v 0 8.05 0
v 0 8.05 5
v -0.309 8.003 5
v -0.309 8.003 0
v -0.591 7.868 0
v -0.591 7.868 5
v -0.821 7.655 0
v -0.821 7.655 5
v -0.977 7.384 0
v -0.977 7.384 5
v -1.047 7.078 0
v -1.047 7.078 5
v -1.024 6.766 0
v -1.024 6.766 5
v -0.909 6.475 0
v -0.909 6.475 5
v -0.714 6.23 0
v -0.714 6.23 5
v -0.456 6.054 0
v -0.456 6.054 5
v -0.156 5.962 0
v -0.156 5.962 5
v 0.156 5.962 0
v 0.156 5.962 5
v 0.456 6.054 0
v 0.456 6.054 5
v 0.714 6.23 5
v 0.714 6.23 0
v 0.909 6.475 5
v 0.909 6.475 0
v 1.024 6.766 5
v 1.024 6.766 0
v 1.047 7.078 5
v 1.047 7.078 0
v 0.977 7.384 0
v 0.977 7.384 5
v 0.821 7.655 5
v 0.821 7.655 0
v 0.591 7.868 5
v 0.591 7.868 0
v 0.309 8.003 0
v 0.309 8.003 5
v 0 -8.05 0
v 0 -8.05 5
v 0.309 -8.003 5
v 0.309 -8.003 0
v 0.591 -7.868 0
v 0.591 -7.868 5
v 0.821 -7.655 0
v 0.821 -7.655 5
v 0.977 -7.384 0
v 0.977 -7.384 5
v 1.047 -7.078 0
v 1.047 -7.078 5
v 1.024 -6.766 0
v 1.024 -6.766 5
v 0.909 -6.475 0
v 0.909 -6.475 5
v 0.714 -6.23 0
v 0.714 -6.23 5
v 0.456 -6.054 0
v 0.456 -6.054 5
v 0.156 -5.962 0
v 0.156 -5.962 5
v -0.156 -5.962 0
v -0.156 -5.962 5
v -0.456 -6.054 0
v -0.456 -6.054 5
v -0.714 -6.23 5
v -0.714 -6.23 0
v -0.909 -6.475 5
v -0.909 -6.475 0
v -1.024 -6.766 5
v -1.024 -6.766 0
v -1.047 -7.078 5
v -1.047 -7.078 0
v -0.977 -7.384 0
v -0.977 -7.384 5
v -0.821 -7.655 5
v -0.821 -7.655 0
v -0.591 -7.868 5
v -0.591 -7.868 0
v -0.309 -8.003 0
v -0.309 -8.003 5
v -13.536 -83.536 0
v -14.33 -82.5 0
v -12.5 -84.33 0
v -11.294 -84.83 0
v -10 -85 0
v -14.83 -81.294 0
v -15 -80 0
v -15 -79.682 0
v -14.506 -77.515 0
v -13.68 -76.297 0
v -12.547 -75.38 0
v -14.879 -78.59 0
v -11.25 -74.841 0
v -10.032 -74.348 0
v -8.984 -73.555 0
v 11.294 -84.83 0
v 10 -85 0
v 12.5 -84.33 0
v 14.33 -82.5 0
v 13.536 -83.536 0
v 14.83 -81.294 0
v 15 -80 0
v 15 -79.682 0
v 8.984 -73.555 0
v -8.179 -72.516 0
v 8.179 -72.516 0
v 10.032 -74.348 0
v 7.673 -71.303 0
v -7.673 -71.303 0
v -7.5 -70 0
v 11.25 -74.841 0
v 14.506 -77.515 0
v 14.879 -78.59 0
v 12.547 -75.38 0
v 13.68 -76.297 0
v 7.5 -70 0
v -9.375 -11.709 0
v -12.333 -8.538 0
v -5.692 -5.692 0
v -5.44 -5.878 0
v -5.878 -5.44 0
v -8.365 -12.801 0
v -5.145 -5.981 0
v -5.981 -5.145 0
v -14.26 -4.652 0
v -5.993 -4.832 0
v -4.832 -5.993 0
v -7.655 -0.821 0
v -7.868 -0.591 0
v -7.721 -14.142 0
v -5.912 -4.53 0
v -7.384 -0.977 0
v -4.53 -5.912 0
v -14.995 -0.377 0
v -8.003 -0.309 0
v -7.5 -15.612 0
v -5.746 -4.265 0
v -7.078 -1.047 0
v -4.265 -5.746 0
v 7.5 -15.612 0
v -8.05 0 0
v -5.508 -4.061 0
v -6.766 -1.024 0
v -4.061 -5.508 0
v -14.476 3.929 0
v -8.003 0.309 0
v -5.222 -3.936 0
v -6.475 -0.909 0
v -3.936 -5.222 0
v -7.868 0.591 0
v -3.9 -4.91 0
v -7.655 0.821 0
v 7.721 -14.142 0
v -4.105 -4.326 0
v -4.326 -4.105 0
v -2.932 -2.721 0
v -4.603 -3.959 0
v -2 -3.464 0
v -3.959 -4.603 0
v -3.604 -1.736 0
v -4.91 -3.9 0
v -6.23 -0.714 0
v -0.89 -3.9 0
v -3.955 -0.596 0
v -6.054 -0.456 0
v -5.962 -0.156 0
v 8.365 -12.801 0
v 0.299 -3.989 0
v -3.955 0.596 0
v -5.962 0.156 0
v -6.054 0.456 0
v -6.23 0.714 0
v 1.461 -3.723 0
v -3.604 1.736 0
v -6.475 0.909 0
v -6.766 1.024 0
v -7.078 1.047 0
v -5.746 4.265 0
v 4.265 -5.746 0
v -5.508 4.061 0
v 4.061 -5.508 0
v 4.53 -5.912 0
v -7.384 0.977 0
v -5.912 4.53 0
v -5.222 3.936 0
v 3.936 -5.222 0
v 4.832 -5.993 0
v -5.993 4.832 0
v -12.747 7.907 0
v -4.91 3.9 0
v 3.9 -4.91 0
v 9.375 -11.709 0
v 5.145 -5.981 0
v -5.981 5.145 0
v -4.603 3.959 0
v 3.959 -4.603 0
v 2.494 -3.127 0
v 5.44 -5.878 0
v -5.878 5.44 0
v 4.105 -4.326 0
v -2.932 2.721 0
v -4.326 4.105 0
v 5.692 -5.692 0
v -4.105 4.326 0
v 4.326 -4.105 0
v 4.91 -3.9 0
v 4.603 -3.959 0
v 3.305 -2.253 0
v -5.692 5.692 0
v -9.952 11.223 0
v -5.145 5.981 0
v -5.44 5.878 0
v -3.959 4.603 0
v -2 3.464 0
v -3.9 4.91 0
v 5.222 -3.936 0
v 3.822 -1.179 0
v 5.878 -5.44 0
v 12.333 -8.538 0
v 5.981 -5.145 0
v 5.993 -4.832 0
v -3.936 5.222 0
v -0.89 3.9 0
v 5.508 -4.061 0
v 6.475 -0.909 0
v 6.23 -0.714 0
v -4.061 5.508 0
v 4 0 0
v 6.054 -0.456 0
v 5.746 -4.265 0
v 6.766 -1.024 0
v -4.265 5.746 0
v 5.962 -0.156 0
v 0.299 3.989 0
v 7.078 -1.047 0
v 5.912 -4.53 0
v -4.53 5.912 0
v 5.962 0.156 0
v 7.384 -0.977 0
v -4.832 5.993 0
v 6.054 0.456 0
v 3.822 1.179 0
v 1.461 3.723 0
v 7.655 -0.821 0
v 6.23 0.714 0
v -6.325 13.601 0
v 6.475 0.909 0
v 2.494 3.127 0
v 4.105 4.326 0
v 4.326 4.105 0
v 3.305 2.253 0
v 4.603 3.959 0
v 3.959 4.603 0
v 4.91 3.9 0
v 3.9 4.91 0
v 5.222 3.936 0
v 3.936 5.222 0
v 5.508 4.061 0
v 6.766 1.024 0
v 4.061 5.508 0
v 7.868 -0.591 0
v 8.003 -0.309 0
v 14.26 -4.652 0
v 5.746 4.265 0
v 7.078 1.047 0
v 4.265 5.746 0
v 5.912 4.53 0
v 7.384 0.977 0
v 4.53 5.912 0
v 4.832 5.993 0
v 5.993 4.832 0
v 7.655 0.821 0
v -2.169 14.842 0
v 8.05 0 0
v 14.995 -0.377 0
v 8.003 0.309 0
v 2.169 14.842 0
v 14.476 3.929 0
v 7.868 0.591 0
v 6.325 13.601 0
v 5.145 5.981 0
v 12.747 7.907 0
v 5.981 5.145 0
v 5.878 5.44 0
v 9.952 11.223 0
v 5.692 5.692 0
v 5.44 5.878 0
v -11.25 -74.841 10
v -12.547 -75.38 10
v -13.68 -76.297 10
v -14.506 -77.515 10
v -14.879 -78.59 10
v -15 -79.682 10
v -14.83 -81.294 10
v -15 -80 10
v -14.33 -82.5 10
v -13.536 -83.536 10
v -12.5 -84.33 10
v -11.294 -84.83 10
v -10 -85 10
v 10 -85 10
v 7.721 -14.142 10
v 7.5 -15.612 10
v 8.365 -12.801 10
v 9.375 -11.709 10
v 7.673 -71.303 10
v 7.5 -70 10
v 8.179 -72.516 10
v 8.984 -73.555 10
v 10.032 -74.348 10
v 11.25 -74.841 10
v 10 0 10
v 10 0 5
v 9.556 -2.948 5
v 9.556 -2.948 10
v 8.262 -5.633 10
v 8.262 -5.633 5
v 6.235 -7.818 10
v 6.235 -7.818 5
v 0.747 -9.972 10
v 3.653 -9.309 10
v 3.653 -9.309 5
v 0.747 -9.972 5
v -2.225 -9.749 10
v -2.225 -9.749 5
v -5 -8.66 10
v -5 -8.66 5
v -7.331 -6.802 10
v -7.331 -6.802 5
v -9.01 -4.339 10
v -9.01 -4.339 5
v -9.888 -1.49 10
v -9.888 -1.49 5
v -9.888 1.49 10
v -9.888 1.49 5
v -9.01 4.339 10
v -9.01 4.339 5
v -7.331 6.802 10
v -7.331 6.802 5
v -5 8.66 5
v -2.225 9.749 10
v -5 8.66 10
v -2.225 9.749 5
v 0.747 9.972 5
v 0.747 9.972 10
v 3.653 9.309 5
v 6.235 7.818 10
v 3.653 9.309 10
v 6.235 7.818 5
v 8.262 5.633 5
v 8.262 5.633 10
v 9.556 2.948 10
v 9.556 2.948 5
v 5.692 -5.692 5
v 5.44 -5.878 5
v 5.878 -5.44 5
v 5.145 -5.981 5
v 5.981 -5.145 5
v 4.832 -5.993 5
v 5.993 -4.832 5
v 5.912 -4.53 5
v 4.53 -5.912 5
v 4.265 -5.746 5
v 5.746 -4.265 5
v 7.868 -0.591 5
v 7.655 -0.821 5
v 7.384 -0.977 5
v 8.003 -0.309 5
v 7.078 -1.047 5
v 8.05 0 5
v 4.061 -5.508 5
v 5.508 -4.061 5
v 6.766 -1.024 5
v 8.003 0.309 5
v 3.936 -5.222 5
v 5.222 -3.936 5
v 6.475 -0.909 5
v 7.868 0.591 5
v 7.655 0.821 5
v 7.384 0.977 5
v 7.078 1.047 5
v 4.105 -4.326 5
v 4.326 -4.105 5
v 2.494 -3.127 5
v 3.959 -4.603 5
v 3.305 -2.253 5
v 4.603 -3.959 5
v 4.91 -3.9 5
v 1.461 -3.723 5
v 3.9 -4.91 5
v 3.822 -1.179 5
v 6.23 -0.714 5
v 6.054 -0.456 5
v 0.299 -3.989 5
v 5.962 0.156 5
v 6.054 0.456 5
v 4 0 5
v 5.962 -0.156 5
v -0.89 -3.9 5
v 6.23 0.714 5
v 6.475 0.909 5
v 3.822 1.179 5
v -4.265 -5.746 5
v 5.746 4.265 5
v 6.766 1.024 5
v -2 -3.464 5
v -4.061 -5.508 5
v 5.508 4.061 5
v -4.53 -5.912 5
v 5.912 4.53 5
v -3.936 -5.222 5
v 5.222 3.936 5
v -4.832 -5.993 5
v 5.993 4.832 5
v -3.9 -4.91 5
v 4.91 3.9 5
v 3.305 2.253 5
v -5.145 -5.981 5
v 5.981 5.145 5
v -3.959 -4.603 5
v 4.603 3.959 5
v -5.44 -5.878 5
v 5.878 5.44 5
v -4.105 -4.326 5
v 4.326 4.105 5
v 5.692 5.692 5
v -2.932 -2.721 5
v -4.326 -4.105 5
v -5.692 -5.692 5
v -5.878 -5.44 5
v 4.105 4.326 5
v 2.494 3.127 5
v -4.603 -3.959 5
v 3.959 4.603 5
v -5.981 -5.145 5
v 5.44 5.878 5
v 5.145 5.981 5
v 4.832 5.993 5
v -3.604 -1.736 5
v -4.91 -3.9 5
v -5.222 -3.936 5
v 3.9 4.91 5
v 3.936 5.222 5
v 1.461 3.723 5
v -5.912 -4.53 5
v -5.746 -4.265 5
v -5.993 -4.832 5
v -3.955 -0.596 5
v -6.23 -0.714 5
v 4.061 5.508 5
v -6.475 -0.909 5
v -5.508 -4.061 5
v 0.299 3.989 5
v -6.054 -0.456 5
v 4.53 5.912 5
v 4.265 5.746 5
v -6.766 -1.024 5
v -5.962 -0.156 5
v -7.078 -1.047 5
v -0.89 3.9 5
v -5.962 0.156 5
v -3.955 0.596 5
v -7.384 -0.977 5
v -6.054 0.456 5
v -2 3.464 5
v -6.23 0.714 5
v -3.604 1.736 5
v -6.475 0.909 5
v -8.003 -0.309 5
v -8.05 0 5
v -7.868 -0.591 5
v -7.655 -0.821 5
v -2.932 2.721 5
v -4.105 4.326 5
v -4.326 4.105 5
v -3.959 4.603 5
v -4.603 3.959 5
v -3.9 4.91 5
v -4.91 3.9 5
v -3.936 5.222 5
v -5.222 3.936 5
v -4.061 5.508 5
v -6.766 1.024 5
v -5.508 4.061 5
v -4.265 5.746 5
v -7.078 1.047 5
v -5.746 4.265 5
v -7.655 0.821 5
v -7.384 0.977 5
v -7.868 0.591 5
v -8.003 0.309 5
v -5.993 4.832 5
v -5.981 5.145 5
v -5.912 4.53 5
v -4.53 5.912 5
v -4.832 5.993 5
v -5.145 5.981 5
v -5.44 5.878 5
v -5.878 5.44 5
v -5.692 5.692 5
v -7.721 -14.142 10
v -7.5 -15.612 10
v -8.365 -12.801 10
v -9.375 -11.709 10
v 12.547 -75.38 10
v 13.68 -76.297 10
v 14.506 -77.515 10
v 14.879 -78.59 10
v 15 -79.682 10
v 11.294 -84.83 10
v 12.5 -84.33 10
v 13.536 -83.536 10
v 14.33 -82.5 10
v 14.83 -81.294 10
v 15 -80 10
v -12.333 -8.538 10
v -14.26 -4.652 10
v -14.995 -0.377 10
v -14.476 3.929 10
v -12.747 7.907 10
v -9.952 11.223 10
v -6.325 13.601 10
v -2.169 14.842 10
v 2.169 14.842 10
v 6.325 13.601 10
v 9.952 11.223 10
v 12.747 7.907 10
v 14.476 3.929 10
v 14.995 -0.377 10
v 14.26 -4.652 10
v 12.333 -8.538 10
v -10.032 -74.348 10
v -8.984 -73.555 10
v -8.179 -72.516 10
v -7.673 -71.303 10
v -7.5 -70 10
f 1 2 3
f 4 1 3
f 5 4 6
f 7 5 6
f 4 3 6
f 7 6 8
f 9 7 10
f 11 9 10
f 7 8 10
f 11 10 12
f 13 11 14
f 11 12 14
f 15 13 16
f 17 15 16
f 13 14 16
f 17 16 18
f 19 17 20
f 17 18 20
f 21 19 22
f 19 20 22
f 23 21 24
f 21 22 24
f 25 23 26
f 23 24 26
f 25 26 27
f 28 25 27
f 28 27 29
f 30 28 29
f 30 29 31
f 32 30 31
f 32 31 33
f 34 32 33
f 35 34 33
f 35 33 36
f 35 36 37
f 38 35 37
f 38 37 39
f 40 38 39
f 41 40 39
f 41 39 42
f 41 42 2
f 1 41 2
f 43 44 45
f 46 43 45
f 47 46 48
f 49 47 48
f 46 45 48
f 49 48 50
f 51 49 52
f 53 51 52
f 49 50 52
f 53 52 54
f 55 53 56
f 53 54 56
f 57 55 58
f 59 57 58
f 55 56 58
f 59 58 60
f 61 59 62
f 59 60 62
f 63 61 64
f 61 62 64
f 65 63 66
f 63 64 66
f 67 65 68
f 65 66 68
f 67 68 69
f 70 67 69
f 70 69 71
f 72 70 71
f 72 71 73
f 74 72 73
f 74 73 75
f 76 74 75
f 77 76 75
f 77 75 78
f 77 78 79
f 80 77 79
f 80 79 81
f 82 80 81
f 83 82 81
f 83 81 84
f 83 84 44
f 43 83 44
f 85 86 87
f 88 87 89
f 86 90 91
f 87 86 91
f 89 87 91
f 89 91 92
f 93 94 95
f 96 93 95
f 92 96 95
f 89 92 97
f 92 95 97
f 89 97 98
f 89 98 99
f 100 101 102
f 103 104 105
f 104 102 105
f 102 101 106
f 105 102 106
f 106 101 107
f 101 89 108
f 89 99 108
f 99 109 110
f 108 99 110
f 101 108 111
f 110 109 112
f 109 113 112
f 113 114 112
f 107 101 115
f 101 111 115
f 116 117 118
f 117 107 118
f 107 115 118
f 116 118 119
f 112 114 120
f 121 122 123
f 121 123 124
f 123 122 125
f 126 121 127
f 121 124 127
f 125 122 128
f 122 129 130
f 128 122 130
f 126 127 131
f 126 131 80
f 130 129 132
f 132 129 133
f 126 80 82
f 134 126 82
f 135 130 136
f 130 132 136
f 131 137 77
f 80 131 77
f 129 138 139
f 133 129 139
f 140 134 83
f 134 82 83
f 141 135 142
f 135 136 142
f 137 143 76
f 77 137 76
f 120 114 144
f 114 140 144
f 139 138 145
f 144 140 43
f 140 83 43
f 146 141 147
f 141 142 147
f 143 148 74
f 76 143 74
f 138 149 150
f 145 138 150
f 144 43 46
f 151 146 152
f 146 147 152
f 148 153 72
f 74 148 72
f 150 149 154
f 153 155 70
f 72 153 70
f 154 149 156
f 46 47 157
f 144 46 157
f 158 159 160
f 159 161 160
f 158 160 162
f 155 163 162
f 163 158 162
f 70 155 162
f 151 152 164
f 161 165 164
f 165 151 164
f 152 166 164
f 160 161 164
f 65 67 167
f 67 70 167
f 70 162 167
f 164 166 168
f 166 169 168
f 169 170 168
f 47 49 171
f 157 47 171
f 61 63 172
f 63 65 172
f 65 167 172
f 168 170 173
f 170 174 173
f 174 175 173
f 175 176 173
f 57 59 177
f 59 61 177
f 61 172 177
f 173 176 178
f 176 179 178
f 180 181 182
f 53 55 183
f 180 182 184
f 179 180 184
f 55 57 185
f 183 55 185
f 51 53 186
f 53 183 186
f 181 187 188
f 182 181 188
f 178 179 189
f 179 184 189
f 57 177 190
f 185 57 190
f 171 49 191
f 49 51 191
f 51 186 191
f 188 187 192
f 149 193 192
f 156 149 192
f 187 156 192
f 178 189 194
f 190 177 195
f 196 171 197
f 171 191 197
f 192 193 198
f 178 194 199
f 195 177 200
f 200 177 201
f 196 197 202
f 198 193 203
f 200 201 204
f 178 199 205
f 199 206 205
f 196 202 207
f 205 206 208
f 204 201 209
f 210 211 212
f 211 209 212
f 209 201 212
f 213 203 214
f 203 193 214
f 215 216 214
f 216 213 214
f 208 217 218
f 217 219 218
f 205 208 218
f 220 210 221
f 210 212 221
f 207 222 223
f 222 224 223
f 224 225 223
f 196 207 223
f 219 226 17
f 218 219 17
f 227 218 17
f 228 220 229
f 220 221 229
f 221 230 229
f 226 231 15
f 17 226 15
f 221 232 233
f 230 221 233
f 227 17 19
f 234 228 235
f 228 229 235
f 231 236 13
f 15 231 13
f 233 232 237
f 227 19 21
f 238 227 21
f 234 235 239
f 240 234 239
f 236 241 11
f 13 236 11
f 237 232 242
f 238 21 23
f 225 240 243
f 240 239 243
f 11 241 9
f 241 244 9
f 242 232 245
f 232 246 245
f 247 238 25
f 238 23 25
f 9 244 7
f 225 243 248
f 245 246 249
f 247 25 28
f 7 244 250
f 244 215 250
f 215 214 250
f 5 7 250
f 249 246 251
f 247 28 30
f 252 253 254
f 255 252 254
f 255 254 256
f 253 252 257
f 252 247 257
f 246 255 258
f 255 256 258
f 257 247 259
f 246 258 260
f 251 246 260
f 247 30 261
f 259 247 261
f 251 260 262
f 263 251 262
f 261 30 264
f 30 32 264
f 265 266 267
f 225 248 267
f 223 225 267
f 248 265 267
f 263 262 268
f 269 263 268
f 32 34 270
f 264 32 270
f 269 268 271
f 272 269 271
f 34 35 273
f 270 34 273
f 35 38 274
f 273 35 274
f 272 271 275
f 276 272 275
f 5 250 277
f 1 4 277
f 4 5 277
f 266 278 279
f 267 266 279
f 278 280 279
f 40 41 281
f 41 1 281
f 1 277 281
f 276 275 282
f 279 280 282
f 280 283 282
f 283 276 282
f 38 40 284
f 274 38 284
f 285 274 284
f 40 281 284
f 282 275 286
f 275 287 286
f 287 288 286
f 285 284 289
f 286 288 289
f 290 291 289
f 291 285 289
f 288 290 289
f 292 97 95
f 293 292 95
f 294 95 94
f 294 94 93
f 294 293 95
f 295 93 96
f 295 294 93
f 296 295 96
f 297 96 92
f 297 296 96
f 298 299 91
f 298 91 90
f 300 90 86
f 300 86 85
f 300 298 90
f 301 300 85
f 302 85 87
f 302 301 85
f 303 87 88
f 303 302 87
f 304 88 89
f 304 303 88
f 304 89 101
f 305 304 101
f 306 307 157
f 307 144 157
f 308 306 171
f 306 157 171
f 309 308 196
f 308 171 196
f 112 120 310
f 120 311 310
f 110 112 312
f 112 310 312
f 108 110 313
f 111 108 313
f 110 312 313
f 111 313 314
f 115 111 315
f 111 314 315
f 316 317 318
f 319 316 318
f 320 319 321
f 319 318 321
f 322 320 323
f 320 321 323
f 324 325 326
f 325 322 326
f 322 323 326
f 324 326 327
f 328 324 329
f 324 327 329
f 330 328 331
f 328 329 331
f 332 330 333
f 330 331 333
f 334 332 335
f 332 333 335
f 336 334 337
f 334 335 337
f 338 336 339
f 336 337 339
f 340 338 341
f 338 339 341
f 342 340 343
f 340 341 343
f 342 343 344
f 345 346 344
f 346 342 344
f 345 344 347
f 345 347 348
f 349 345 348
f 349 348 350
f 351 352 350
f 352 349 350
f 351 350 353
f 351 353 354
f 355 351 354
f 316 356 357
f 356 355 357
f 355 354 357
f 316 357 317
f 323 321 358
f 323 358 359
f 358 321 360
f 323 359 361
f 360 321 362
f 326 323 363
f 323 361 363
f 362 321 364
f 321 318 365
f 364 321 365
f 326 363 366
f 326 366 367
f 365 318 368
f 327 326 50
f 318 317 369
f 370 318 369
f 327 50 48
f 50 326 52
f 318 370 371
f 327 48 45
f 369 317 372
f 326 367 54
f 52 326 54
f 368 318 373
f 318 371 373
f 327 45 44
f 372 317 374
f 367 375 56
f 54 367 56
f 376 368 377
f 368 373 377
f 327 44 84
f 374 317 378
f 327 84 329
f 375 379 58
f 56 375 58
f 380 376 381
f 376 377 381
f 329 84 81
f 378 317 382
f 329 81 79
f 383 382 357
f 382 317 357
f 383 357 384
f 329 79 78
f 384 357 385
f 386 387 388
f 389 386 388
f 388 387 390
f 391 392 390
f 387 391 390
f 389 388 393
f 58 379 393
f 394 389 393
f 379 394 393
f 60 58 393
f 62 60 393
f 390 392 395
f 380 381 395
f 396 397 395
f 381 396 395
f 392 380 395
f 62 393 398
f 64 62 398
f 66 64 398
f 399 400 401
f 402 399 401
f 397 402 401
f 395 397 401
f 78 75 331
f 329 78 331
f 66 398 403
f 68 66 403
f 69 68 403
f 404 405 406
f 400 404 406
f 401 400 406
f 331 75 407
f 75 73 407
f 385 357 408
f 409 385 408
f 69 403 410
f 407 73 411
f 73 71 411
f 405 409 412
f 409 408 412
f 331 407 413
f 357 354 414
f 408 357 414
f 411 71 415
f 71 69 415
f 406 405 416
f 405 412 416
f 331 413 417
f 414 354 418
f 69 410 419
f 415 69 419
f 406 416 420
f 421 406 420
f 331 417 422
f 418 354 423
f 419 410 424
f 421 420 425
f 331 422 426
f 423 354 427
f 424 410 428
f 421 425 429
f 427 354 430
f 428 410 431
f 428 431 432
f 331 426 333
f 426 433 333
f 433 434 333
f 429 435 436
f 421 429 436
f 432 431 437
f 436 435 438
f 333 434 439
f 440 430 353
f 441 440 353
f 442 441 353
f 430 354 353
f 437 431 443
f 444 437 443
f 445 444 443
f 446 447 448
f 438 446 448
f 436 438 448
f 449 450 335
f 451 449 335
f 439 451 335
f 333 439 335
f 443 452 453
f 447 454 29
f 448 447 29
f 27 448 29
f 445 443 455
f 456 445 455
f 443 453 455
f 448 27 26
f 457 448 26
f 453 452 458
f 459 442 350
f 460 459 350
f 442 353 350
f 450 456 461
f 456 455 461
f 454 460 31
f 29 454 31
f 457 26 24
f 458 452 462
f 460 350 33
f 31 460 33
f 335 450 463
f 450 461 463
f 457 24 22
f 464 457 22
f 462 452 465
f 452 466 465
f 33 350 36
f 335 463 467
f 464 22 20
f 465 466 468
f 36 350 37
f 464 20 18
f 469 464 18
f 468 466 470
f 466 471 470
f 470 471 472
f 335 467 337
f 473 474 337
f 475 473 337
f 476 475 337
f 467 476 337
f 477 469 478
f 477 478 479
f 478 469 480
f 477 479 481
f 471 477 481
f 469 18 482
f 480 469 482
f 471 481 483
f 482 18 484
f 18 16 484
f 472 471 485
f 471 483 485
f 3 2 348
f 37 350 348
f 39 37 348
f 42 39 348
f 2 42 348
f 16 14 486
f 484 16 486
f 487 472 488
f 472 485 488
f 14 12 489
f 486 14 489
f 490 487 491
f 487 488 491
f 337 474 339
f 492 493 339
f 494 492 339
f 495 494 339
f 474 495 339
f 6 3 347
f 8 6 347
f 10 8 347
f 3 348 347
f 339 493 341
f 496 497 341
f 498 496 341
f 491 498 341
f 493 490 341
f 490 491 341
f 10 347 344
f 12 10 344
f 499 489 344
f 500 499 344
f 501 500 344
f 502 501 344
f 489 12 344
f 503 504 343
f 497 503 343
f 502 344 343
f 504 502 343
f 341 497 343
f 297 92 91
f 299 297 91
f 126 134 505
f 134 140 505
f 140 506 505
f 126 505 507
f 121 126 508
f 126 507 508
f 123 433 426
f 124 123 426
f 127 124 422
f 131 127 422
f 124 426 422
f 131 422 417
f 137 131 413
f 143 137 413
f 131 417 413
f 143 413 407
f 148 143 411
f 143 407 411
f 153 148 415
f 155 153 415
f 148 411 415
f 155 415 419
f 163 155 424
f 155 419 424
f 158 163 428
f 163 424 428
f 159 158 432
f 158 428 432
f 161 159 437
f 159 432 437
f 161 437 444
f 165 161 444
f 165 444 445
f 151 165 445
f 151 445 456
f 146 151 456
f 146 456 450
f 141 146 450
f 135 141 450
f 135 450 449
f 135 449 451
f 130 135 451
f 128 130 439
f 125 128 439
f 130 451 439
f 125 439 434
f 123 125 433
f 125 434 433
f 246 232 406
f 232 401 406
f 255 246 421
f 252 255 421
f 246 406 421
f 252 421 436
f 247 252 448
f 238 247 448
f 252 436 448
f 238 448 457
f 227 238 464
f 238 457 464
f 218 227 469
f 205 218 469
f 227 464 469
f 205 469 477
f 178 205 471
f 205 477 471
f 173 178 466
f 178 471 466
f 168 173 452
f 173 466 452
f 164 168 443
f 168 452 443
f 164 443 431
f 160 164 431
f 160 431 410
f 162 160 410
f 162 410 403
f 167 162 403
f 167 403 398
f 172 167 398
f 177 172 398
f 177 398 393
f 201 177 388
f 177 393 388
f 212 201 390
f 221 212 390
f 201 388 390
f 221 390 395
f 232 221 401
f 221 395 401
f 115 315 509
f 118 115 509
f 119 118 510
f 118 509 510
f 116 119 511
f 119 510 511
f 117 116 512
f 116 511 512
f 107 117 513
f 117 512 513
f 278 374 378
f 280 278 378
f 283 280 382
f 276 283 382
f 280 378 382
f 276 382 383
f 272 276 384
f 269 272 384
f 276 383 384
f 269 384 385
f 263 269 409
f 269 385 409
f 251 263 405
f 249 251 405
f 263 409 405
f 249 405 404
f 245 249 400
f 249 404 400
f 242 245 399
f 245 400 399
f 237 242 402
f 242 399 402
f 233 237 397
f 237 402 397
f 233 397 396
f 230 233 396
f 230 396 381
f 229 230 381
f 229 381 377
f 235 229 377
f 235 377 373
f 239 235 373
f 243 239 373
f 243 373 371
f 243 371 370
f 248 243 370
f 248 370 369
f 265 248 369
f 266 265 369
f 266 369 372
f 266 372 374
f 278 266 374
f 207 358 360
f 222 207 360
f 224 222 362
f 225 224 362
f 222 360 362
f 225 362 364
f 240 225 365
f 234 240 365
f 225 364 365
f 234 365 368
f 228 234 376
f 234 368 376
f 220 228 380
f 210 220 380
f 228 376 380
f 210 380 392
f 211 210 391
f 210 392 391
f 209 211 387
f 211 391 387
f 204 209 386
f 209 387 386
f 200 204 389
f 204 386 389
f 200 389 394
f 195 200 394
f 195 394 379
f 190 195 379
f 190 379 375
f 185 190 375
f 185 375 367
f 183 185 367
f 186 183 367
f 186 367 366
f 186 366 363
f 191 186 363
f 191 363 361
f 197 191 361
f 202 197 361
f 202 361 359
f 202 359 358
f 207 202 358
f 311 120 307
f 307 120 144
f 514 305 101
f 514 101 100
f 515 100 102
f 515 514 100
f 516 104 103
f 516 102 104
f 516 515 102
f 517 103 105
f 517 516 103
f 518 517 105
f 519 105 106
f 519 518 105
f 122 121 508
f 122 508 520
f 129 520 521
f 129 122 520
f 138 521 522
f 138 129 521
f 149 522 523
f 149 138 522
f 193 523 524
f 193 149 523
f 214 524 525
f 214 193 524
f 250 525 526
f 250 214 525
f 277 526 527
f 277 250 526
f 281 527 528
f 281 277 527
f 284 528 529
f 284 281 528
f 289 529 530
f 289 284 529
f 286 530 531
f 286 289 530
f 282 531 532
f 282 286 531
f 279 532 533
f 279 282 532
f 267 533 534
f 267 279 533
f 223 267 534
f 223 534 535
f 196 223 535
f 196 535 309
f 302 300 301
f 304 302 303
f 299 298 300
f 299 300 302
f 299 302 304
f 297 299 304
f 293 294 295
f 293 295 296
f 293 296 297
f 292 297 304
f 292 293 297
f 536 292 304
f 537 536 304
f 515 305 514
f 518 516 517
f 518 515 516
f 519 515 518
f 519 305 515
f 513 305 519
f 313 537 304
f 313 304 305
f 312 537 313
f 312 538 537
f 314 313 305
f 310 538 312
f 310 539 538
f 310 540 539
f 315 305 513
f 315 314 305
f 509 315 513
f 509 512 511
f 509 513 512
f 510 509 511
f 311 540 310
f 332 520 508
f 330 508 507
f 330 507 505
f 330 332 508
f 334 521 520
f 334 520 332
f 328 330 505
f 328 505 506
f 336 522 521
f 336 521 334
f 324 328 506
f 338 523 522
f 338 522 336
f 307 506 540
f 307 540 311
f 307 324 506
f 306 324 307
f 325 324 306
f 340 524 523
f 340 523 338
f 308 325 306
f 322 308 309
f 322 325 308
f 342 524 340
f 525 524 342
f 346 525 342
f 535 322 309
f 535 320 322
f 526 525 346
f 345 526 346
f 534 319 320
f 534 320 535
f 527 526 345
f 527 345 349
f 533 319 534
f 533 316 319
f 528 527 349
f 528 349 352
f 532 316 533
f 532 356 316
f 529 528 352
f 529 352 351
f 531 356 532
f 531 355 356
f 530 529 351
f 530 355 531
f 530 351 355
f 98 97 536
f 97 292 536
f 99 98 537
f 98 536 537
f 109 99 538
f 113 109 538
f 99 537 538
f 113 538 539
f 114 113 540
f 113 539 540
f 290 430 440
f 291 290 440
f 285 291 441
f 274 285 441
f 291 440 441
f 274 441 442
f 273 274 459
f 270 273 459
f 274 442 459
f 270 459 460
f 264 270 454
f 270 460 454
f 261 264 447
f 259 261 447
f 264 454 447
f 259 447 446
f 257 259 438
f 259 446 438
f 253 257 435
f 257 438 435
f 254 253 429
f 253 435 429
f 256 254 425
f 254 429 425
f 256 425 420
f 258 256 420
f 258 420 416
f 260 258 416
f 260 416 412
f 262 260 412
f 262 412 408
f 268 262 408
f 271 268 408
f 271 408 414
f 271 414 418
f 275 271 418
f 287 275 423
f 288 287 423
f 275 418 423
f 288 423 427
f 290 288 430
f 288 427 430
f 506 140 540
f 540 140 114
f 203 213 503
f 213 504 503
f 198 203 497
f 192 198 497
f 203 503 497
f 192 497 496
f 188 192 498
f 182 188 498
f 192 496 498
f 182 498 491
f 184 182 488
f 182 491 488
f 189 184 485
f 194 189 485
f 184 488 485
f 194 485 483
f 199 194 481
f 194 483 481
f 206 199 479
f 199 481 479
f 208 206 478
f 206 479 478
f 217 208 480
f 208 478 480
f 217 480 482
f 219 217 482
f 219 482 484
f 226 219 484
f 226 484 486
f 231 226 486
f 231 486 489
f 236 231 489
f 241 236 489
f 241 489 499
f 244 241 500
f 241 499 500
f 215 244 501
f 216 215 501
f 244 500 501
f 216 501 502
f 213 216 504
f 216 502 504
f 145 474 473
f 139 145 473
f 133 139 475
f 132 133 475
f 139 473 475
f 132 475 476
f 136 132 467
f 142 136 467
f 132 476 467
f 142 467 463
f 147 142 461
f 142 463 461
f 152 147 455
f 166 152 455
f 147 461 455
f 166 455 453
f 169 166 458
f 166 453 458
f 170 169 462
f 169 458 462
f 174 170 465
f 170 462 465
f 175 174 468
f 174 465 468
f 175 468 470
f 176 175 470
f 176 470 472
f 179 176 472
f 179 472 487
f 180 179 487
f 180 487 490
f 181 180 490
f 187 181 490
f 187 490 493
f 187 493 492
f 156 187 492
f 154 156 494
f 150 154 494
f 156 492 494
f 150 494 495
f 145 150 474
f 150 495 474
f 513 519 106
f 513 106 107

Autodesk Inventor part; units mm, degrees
ref_plane "YZ Plane" through (0, 0, 0) normal (1, 0, 0) x (0, 1, 0)
ref_plane "XZ Plane" through (0, 0, 0) normal (0, 1, 0) x (-1, 0, 0)
ref_plane "XY Plane" through (0, 0, 0) normal (0, 0, 1) x (1, 0, 0)
sketch "Sketch1" plane through (0, 0, 0) normal (0, 0, 1) x (1, 0, 0)
  circle A0 centre (0, 0) radius 30
  dimension "d0" = 60
extrude "Extrusion1" add sketch "Sketch1" along normal blind 5
sketch "Sketch2" plane through (0, 0, 5) normal (0, 0, 1) x (1, 0, 0)
  circle A0 centre (0, 0) radius 24.95
  dimension "d3" = 49.9
extrude "Extrusion2" add sketch "Sketch2" along normal blind 5
sketch "Sketch3" plane through (0, 0, 10) normal (0, 0, 1) x (1, 0, 0)
  circle A0 centre (0, 0) radius 15
  dimension "d6" = 30
extrude "Extrusion3" cut sketch "Sketch3" against normal through all
sketch "Sketch4" plane through (0, 0, 0) normal (0, 0, -1) x (-1, 0, 0)
  circle A0 centre (0, 0) radius 20
  dimension "d9" = 40
extrude "Extrusion4" add sketch "Sketch4" against normal blind 5
sketch "Sketch5" plane through (0, 0, 0) normal (0, 0, -1) x (-1, 0, 0)
  circle A0 centre (0, 0) radius 3.5
  dimension "d12" = 7
extrude "Extrusion5" cut sketch "Sketch5" against normal through all
sketch "Sketch6" plane through (0, 0, 5) normal (0, 0, 1) x (1, 0, 0)
  circle A0 centre (7, 0) radius 1.05
  point P0 (0, 0)
  dimension "d15" = 2.1
  dimension "d16" = 7
extrude "Extrusion6" cut sketch "Sketch6" against normal through all
pattern_circular "Circular Pattern1" count 8 over 360 about axis through (0, 0, -10) along (0, 0, 1) of "Extrusion6"
sketch "Sketch9" plane through (0, 0, 0) normal (0, 0, -1) x (-1, 0, 0)
  circle A0 centre (0, 0) radius 15
  circle A1 centre (-4.9497, -4.9497) radius 1.05 projected
  circle A2 centre (0, -7) radius 1.05 projected
  circle A3 centre (4.9497, -4.9497) radius 1.05 projected
  circle A4 centre (7, 0) radius 1.05 projected
  circle A5 centre (4.9497, 4.9497) radius 1.05 projected
  circle A6 centre (0, 7) radius 1.05 projected
  circle A7 centre (-4.9497, 4.9497) radius 1.05 projected
  circle A8 centre (-7, 0) radius 1.05 projected
  circle A9 centre (0, 0) radius 3.5 projected
  circle A10 centre (0, 0) radius 30 projected
  dimension "d35" = 30
extrude "Extrusion9" cut sketch "Sketch9" against normal through all contours A10
sketch "Sketch10" plane through (0, 0, 5) normal (0, 0, 1) x (1, 0, 0)
  circle A0 centre (0, 0) radius 10
  circle A1 centre (4.9497, -4.9497) radius 1.05 projected
  circle A2 centre (0, -7) radius 1.05 projected
  circle A3 centre (-4.9497, -4.9497) radius 1.05 projected
  circle A4 centre (-7, 0) radius 1.05 projected
  circle A5 centre (-4.9497, 4.9497) radius 1.05 projected
  circle A6 centre (0, 7) radius 1.05 projected
  circle A7 centre (4.9497, 4.9497) radius 1.05 projected
  circle A8 centre (7, 0) radius 1.05 projected
  circle A9 centre (0, 0) radius 3.5 projected
  circle A10 centre (0, 0) radius 15 projected
  dimension "d38" = 20
extrude "Extrusion10" add sketch "Sketch10" along normal blind 5 contours A10
sketch "Sketch11" plane through (0, 0, 0) normal (0, 0, -1) x (-1, 0, 0)
  line L0 (-7.5, 0) -> (7.5, 0)
  line L1 (7.5, 0) -> (7.5, -80)
  line L2 (7.5, -80) -> (-7.5, -80)
  line L3 (-7.5, -80) -> (-7.5, 0)
  line L4 (-7.5, 0) -> (7.5, -80) construction
  line L5 (7.5, 0) -> (-7.5, -80) construction
  circle A0 centre (0, 0) radius 15 projected
  circle A1 centre (-4.9497, -4.9497) radius 1.05 projected
  circle A2 centre (0, -7) radius 1.05 projected
  circle A3 centre (4.9497, -4.9497) radius 1.05 projected
  circle A4 centre (7, 0) radius 1.05 projected
  circle A5 centre (4.9497, 4.9497) radius 1.05 projected
  circle A6 centre (0, 7) radius 1.05 projected
  circle A7 centre (-4.9497, 4.9497) radius 1.05 projected
  circle A8 centre (-7, 0) radius 1.05 projected
  circle A9 centre (0, 0) radius 3.5 projected
  line L6 (-15, -75) -> (15, -75)
  line L7 (15, -75) -> (15, -85)
  line L8 (15, -85) -> (-15, -85)
  line L9 (-15, -85) -> (-15, -75)
  line L10 (-15, -75) -> (15, -85) construction
  line L11 (15, -75) -> (-15, -85) construction
  point P0 (0, -40)
  point P1 (7.5, -12.9904)
  point P2 (-7.5, -12.9904)
  point P3 (0, -80)
  point P4 (-7.5, -75)
  point P5 (7.5, -75)
  point P6 (0, 0)
  dimension "d41" = 80
  dimension "d42" = 15
  dimension "d43" = 40
  dimension "d46" = 30
  dimension "d47" = 10
extrude "Extrusion11" add sketch "Sketch11" against normal blind 10 contours A0 L1 L6 L3 | L6 L1 L2 L3 | L3 L2 L1 L6 L7 L8 L9
fillet "Fillet1" radius 5 8 edges at (-7.5, -12.9904, 5) (7.5, -12.9904, 5) (7.5, -75, 5) (15, -75, 5) (15, -85, 5) (-7.5, -75, 5) (-15, -75, 5) (-15, -85, 5)
sketch "Sketch12" plane through (0, 0, 5) normal (0, 0, 1) x (1, 0, 0)
  circle A0 centre (0, 0) radius 4
  dimension "d49" = 8
extrude "Extrusion12" cut sketch "Sketch12" against normal blind 10
properties part number "bearing_bracket3"
